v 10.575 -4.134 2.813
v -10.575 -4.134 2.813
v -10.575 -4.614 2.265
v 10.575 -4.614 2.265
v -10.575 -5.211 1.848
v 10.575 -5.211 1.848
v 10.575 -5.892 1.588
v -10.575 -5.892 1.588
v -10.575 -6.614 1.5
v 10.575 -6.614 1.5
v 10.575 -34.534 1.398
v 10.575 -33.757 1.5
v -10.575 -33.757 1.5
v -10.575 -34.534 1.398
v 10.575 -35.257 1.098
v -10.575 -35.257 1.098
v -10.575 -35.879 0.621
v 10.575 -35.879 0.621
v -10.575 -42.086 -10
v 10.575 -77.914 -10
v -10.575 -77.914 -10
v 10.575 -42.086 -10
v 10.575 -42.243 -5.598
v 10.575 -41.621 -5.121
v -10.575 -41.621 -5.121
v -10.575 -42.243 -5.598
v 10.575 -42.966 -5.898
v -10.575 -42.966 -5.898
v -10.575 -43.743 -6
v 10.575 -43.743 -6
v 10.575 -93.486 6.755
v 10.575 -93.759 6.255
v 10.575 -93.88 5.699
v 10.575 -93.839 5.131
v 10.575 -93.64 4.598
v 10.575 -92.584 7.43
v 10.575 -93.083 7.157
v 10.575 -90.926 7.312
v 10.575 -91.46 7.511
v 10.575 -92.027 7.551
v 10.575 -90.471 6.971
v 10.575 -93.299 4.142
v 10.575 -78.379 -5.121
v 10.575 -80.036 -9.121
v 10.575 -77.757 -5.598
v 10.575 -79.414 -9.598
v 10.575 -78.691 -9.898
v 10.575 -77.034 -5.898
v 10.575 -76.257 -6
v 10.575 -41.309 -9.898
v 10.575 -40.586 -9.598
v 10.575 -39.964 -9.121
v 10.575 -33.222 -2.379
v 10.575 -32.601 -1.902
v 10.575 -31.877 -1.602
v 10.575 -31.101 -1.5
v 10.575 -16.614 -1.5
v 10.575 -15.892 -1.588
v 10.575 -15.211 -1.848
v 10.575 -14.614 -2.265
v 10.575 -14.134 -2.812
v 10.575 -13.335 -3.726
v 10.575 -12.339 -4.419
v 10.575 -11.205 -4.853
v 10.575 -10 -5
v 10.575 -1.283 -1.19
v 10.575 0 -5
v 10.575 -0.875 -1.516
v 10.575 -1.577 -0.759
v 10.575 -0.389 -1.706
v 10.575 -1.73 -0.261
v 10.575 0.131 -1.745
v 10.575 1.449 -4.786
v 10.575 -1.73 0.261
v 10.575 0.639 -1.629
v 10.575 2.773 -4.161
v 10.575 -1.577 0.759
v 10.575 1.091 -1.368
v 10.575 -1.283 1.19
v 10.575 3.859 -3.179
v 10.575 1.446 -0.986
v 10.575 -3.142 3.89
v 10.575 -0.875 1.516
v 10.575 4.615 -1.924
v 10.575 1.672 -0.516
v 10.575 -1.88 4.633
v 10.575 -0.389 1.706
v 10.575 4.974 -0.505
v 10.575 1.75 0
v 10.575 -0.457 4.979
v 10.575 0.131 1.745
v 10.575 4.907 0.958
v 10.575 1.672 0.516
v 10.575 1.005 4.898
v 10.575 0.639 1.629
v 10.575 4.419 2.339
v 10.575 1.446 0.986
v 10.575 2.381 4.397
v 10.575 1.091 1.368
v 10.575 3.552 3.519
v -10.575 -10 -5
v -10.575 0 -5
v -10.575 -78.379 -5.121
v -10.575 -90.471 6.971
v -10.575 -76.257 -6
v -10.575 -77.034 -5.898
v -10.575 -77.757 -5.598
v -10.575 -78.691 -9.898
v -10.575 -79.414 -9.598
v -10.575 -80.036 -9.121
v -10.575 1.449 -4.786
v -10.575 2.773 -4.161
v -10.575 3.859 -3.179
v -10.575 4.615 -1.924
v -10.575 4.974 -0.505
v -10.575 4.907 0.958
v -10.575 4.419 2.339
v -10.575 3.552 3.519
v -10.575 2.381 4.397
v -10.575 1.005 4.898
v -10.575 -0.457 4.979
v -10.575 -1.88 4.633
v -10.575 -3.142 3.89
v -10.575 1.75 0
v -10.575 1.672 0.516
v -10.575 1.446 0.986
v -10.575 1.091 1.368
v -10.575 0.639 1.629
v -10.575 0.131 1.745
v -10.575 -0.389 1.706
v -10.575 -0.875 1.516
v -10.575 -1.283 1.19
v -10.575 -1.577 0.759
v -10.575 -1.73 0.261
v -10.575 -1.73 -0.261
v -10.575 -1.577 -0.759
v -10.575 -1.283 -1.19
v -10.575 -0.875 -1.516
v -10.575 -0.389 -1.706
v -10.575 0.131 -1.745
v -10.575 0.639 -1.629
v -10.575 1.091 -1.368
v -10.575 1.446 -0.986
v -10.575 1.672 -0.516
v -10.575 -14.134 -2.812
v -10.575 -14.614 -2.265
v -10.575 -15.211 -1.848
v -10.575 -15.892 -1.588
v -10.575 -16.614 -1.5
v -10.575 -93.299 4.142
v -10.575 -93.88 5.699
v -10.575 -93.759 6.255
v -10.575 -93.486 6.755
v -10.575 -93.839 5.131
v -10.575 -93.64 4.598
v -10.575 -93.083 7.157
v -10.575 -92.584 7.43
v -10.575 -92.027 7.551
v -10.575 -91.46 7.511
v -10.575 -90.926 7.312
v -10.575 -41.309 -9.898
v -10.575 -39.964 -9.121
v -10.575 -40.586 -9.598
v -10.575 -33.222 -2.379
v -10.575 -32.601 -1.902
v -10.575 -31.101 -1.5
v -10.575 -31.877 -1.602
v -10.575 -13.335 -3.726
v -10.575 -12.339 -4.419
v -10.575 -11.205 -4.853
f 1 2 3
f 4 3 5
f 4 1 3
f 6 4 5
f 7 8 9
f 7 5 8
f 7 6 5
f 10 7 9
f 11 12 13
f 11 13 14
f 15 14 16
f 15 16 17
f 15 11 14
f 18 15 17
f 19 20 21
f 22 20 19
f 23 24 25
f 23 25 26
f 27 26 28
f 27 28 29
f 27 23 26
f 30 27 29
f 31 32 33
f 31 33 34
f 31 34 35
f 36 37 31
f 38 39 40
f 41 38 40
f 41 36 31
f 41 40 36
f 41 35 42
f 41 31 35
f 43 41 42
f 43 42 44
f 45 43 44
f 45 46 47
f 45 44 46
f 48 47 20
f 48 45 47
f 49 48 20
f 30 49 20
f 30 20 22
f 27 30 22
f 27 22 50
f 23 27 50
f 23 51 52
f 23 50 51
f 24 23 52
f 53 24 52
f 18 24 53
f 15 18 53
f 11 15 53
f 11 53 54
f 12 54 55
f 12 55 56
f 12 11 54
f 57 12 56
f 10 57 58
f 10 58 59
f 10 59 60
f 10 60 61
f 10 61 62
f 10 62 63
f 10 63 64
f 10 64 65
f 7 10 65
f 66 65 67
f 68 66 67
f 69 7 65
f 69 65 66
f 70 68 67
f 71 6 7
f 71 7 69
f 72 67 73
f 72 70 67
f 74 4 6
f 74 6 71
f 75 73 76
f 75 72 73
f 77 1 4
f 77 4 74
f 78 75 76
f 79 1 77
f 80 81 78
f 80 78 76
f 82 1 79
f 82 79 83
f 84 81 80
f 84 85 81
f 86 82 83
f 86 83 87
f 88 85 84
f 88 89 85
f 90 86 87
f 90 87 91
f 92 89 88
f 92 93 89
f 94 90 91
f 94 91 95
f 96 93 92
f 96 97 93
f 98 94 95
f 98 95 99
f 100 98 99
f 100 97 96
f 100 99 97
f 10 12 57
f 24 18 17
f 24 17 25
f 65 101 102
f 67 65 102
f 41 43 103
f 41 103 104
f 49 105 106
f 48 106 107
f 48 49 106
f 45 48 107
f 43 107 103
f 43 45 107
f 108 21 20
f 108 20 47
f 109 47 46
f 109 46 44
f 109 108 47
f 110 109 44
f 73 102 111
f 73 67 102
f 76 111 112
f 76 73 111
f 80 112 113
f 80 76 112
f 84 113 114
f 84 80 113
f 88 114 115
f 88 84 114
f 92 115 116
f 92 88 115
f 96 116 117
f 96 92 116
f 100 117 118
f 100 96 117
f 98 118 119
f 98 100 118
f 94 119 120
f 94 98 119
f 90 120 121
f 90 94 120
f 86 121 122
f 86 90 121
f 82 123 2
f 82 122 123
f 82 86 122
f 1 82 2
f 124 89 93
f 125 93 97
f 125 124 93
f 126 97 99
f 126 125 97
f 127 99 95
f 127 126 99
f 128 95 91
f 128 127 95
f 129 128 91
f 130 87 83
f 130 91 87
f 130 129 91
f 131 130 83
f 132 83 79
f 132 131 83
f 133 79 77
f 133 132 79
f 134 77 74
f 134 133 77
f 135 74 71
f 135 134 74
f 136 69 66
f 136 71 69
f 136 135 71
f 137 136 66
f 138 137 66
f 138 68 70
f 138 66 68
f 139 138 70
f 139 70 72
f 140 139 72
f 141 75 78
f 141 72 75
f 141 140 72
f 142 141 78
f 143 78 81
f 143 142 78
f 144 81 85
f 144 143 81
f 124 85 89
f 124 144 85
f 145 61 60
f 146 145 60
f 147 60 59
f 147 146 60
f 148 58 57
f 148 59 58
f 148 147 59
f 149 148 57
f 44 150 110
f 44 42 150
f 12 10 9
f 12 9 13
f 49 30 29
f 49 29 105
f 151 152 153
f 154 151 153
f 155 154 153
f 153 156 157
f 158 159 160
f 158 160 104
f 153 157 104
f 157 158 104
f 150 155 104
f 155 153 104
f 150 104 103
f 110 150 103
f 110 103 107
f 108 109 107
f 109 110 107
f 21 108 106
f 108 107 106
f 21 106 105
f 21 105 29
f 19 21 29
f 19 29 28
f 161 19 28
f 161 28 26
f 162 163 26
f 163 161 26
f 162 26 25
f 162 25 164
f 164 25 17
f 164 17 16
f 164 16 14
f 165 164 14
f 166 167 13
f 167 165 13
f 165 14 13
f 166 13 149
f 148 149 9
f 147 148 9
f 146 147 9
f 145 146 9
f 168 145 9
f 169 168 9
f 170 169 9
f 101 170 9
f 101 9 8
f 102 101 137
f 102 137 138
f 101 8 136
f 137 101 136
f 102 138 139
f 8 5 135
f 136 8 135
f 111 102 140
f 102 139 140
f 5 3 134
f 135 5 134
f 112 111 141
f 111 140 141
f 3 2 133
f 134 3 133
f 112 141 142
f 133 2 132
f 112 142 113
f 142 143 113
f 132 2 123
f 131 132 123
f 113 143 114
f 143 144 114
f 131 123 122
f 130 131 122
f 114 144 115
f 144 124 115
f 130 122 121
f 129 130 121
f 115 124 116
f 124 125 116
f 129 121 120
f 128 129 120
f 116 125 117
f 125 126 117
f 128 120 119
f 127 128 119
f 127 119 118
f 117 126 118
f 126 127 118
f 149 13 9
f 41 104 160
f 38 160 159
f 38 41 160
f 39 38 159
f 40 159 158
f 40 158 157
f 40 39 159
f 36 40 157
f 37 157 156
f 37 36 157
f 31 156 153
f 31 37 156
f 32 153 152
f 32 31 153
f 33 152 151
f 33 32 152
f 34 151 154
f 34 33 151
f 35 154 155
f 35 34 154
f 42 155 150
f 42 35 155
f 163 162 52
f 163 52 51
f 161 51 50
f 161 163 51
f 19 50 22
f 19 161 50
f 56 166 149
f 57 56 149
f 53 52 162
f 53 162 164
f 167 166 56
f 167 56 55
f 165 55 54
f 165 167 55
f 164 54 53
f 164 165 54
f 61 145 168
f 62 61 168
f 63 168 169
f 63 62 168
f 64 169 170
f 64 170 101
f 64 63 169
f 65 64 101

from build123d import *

# Parameters (mm, degrees)
F0_R          = 1.75
F1_DEPTH      = 15.875
F3_DEPTH      = 31.75
F4_R          = 3
F5_W          = 5
F5_H          = 35
F6_DEPTH      = 10.001
F6_DEPTH_BACK = 7.5573491861
F7_T1_DEPTH   = 8.7055800262
F7_T3_DEPTH   = 8.75
F7_T5_DEPTH   = 8.75
F7_T7_DEPTH   = 8.7055800262
F8_DEPTH      = 0.3
F9_DEPTH      = 0.3
F10_DEPTH     = 5.3
F11_DEPTH     = 5.3


# Not quite as in the source:
# - a fillet or chamfer that OpenCascade refuses, or shapes differently, is made with other operations: its cross-section is extruded or revolved along the edge and cut away or added


with BuildPart() as f1:
    # F0 (on Right) → F1 (new body, symmetric)
    with BuildSketch(Plane.YZ):
        with BuildLine():
            Line((-5.2303039929, -1.5), (-4.7696960071, -1.5))
            ThreePointArc((-4.7696960071, -1.5), (5, 0), (-4.7696960071, 1.5))
            Line((-4.7696960071, 1.5), (-35, 1.5))
            Line((-35, 1.5), (-42.5, -6))
            Line((-42.5, -6), (-77.5, -6))
            Line((-77.5, -6), (-90.4705627485, 6.9705627485))
            ThreePointArc((-90.4705627485, 6.9705627485), (-93.2989898732, 6.9705627485), (-93.2989898732, 4.1421356237))
            Line((-93.2989898732, 4.1421356237), (-79.1568542495, -10))
            Line((-79.1568542495, -10), (-40.8431457505, -10))
            Line((-40.8431457505, -10), (-32.3431457505, -1.5))
            Line((-32.3431457505, -1.5), (-14.7696960071, -1.5))
            ThreePointArc((-14.7696960071, -1.5), (-10, -5), (-5.2303039929, -1.5))
        make_face()
        Circle(F0_R, mode=Mode.SUBTRACT)
    extrude(amount=F1_DEPTH, both=True)

    # F2 (on face) → F3 (join, through all)
    with BuildSketch(Plane.YZ.offset(15.875)):
        with BuildLine():
            ThreePointArc((-5.2303039929, -1.5), (-7.0419601085, -4.0311288741), (-10, -5))
            Line((-10, -5), (0, -5))
            ThreePointArc((0, -5), (-2.9580398915, -4.0311288741), (-4.7696960071, -1.5))
            Line((-4.7696960071, -1.5), (-5.2303039929, -1.5))
        make_face()
    extrude(amount=-F3_DEPTH)

    # F4
    f4_edges = [f1.edges().sort_by_distance(p)[0] for p in [
        (0, -4.769696, 1.5),
        (0, -14.769696, -1.5),
        (0, -77.5, -6),
        (0, -79.156854, -10),
        (0, -40.843146, -10),
        (0, -32.343146, -1.5),
        (0, -42.5, -6),
        (0, -35, 1.5),
    ]]
    fillet(f4_edges, radius=F4_R)

    # F5 (on Top) → F6 (cut, two sides)
    with BuildSketch(Plane.XY) as f6_sk:
        with Locations((-13.375, -12.5)):
            Rectangle(F5_W, F5_H)
        with Locations((13.375, -12.5)):
            Rectangle(F5_W, F5_H)
    extrude(amount=-F6_DEPTH, mode=Mode.SUBTRACT)
    extrude(f6_sk.sketch, amount=F6_DEPTH_BACK, mode=Mode.SUBTRACT)

    # F7: fillet of radius 1.5 on 4 edges, made by hand

    # F7_s2 → F7_t1 (cut)
    with BuildSketch(Plane.YZ.offset(10.875)):
        with BuildLine():
            ThreePointArc((-31.3668350211, -1.5118453264), (-30.3932598615, -1.0302531824), (-30, -0.0177679895))
            Line((-30, -0.0177679895), (-29.85, -0.0177679895))
            Line((-29.85, -0.0177679895), (-29.85, -1.5))
            Line((-29.85, -1.5), (-30, -1.65))
            ThreePointArc((-30, -1.65), (-31.1005050634, -1.65), (-31.3535185232, -1.66125306))
            Line((-31.3535185232, -1.66125306), (-31.3668350211, -1.5118453264))
        make_face()
    extrude(amount=F7_T1_DEPTH, mode=Mode.SUBTRACT)

    # F7_s4 → F7_t3 (cut)
    with BuildSketch(Plane.YZ.offset(10.875)):
        with BuildLine():
            ThreePointArc((-30, 0), (-30.4393398282, 1.0606601718), (-31.5, 1.5))
            Line((-31.5, 1.5), (-30, 1.5))
            Line((-30, 1.5), (-30, 0))
        make_face()
    extrude(amount=F7_T3_DEPTH, mode=Mode.SUBTRACT)

    # F7_s6 → F7_t5 (cut)
    with BuildSketch(Plane.YZ.offset(-19.625)):
        with BuildLine():
            ThreePointArc((-30, 0), (-30.4393398282, 1.0606601718), (-31.5, 1.5))
            Line((-31.5, 1.5), (-30, 1.5))
            Line((-30, 1.5), (-30, 0))
        make_face()
    extrude(amount=F7_T5_DEPTH, mode=Mode.SUBTRACT)

    # F7_s8 → F7_t7 (cut)
    with BuildSketch(Plane.YZ.offset(-19.5805800262)):
        with BuildLine():
            ThreePointArc((-31.3668350211, -1.5118453264), (-30.3932598615, -1.0302531824), (-30, -0.0177679895))
            Line((-30, -0.0177679895), (-29.85, -0.0177679895))
            Line((-29.85, -0.0177679895), (-29.85, -1.5))
            Line((-29.85, -1.5), (-30, -1.65))
            ThreePointArc((-30, -1.65), (-31.1005050634, -1.65), (-31.3535185232, -1.66125306))
            Line((-31.3535185232, -1.66125306), (-31.3668350211, -1.5118453264))
        make_face()
    extrude(amount=F7_T7_DEPTH, mode=Mode.SUBTRACT)

    # F8 (cut): a face of the model
    f8_faces = [f1.faces().sort_by_distance(p)[0] for p in [
        (10.875, -9.1101781633, -0.6280033564),
    ]]
    extrude(f8_faces, amount=-F8_DEPTH, mode=Mode.SUBTRACT)

    # F9 (cut): a face of the model
    f9_faces = [f1.faces().sort_by_distance(p)[0] for p in [
        (-10.875, -9.1101781633, -0.6280033564),
    ]]
    extrude(f9_faces, amount=-F9_DEPTH, mode=Mode.SUBTRACT)

    # F10 (cut, through all): a face of the model
    f10_faces = [f1.faces().sort_by_distance(p)[0] for p in [
        (15.875, -86.1987808312, -2.0211113015),
    ]]
    extrude(f10_faces, amount=-F10_DEPTH, mode=Mode.SUBTRACT)

    # F11 (cut, through all): a face of the model
    f11_faces = [f1.faces().sort_by_distance(p)[0] for p in [
        (-15.875, -86.1987808312, -2.0211113015),
    ]]
    extrude(f11_faces, amount=-F11_DEPTH, mode=Mode.SUBTRACT)


solid = f1.part
